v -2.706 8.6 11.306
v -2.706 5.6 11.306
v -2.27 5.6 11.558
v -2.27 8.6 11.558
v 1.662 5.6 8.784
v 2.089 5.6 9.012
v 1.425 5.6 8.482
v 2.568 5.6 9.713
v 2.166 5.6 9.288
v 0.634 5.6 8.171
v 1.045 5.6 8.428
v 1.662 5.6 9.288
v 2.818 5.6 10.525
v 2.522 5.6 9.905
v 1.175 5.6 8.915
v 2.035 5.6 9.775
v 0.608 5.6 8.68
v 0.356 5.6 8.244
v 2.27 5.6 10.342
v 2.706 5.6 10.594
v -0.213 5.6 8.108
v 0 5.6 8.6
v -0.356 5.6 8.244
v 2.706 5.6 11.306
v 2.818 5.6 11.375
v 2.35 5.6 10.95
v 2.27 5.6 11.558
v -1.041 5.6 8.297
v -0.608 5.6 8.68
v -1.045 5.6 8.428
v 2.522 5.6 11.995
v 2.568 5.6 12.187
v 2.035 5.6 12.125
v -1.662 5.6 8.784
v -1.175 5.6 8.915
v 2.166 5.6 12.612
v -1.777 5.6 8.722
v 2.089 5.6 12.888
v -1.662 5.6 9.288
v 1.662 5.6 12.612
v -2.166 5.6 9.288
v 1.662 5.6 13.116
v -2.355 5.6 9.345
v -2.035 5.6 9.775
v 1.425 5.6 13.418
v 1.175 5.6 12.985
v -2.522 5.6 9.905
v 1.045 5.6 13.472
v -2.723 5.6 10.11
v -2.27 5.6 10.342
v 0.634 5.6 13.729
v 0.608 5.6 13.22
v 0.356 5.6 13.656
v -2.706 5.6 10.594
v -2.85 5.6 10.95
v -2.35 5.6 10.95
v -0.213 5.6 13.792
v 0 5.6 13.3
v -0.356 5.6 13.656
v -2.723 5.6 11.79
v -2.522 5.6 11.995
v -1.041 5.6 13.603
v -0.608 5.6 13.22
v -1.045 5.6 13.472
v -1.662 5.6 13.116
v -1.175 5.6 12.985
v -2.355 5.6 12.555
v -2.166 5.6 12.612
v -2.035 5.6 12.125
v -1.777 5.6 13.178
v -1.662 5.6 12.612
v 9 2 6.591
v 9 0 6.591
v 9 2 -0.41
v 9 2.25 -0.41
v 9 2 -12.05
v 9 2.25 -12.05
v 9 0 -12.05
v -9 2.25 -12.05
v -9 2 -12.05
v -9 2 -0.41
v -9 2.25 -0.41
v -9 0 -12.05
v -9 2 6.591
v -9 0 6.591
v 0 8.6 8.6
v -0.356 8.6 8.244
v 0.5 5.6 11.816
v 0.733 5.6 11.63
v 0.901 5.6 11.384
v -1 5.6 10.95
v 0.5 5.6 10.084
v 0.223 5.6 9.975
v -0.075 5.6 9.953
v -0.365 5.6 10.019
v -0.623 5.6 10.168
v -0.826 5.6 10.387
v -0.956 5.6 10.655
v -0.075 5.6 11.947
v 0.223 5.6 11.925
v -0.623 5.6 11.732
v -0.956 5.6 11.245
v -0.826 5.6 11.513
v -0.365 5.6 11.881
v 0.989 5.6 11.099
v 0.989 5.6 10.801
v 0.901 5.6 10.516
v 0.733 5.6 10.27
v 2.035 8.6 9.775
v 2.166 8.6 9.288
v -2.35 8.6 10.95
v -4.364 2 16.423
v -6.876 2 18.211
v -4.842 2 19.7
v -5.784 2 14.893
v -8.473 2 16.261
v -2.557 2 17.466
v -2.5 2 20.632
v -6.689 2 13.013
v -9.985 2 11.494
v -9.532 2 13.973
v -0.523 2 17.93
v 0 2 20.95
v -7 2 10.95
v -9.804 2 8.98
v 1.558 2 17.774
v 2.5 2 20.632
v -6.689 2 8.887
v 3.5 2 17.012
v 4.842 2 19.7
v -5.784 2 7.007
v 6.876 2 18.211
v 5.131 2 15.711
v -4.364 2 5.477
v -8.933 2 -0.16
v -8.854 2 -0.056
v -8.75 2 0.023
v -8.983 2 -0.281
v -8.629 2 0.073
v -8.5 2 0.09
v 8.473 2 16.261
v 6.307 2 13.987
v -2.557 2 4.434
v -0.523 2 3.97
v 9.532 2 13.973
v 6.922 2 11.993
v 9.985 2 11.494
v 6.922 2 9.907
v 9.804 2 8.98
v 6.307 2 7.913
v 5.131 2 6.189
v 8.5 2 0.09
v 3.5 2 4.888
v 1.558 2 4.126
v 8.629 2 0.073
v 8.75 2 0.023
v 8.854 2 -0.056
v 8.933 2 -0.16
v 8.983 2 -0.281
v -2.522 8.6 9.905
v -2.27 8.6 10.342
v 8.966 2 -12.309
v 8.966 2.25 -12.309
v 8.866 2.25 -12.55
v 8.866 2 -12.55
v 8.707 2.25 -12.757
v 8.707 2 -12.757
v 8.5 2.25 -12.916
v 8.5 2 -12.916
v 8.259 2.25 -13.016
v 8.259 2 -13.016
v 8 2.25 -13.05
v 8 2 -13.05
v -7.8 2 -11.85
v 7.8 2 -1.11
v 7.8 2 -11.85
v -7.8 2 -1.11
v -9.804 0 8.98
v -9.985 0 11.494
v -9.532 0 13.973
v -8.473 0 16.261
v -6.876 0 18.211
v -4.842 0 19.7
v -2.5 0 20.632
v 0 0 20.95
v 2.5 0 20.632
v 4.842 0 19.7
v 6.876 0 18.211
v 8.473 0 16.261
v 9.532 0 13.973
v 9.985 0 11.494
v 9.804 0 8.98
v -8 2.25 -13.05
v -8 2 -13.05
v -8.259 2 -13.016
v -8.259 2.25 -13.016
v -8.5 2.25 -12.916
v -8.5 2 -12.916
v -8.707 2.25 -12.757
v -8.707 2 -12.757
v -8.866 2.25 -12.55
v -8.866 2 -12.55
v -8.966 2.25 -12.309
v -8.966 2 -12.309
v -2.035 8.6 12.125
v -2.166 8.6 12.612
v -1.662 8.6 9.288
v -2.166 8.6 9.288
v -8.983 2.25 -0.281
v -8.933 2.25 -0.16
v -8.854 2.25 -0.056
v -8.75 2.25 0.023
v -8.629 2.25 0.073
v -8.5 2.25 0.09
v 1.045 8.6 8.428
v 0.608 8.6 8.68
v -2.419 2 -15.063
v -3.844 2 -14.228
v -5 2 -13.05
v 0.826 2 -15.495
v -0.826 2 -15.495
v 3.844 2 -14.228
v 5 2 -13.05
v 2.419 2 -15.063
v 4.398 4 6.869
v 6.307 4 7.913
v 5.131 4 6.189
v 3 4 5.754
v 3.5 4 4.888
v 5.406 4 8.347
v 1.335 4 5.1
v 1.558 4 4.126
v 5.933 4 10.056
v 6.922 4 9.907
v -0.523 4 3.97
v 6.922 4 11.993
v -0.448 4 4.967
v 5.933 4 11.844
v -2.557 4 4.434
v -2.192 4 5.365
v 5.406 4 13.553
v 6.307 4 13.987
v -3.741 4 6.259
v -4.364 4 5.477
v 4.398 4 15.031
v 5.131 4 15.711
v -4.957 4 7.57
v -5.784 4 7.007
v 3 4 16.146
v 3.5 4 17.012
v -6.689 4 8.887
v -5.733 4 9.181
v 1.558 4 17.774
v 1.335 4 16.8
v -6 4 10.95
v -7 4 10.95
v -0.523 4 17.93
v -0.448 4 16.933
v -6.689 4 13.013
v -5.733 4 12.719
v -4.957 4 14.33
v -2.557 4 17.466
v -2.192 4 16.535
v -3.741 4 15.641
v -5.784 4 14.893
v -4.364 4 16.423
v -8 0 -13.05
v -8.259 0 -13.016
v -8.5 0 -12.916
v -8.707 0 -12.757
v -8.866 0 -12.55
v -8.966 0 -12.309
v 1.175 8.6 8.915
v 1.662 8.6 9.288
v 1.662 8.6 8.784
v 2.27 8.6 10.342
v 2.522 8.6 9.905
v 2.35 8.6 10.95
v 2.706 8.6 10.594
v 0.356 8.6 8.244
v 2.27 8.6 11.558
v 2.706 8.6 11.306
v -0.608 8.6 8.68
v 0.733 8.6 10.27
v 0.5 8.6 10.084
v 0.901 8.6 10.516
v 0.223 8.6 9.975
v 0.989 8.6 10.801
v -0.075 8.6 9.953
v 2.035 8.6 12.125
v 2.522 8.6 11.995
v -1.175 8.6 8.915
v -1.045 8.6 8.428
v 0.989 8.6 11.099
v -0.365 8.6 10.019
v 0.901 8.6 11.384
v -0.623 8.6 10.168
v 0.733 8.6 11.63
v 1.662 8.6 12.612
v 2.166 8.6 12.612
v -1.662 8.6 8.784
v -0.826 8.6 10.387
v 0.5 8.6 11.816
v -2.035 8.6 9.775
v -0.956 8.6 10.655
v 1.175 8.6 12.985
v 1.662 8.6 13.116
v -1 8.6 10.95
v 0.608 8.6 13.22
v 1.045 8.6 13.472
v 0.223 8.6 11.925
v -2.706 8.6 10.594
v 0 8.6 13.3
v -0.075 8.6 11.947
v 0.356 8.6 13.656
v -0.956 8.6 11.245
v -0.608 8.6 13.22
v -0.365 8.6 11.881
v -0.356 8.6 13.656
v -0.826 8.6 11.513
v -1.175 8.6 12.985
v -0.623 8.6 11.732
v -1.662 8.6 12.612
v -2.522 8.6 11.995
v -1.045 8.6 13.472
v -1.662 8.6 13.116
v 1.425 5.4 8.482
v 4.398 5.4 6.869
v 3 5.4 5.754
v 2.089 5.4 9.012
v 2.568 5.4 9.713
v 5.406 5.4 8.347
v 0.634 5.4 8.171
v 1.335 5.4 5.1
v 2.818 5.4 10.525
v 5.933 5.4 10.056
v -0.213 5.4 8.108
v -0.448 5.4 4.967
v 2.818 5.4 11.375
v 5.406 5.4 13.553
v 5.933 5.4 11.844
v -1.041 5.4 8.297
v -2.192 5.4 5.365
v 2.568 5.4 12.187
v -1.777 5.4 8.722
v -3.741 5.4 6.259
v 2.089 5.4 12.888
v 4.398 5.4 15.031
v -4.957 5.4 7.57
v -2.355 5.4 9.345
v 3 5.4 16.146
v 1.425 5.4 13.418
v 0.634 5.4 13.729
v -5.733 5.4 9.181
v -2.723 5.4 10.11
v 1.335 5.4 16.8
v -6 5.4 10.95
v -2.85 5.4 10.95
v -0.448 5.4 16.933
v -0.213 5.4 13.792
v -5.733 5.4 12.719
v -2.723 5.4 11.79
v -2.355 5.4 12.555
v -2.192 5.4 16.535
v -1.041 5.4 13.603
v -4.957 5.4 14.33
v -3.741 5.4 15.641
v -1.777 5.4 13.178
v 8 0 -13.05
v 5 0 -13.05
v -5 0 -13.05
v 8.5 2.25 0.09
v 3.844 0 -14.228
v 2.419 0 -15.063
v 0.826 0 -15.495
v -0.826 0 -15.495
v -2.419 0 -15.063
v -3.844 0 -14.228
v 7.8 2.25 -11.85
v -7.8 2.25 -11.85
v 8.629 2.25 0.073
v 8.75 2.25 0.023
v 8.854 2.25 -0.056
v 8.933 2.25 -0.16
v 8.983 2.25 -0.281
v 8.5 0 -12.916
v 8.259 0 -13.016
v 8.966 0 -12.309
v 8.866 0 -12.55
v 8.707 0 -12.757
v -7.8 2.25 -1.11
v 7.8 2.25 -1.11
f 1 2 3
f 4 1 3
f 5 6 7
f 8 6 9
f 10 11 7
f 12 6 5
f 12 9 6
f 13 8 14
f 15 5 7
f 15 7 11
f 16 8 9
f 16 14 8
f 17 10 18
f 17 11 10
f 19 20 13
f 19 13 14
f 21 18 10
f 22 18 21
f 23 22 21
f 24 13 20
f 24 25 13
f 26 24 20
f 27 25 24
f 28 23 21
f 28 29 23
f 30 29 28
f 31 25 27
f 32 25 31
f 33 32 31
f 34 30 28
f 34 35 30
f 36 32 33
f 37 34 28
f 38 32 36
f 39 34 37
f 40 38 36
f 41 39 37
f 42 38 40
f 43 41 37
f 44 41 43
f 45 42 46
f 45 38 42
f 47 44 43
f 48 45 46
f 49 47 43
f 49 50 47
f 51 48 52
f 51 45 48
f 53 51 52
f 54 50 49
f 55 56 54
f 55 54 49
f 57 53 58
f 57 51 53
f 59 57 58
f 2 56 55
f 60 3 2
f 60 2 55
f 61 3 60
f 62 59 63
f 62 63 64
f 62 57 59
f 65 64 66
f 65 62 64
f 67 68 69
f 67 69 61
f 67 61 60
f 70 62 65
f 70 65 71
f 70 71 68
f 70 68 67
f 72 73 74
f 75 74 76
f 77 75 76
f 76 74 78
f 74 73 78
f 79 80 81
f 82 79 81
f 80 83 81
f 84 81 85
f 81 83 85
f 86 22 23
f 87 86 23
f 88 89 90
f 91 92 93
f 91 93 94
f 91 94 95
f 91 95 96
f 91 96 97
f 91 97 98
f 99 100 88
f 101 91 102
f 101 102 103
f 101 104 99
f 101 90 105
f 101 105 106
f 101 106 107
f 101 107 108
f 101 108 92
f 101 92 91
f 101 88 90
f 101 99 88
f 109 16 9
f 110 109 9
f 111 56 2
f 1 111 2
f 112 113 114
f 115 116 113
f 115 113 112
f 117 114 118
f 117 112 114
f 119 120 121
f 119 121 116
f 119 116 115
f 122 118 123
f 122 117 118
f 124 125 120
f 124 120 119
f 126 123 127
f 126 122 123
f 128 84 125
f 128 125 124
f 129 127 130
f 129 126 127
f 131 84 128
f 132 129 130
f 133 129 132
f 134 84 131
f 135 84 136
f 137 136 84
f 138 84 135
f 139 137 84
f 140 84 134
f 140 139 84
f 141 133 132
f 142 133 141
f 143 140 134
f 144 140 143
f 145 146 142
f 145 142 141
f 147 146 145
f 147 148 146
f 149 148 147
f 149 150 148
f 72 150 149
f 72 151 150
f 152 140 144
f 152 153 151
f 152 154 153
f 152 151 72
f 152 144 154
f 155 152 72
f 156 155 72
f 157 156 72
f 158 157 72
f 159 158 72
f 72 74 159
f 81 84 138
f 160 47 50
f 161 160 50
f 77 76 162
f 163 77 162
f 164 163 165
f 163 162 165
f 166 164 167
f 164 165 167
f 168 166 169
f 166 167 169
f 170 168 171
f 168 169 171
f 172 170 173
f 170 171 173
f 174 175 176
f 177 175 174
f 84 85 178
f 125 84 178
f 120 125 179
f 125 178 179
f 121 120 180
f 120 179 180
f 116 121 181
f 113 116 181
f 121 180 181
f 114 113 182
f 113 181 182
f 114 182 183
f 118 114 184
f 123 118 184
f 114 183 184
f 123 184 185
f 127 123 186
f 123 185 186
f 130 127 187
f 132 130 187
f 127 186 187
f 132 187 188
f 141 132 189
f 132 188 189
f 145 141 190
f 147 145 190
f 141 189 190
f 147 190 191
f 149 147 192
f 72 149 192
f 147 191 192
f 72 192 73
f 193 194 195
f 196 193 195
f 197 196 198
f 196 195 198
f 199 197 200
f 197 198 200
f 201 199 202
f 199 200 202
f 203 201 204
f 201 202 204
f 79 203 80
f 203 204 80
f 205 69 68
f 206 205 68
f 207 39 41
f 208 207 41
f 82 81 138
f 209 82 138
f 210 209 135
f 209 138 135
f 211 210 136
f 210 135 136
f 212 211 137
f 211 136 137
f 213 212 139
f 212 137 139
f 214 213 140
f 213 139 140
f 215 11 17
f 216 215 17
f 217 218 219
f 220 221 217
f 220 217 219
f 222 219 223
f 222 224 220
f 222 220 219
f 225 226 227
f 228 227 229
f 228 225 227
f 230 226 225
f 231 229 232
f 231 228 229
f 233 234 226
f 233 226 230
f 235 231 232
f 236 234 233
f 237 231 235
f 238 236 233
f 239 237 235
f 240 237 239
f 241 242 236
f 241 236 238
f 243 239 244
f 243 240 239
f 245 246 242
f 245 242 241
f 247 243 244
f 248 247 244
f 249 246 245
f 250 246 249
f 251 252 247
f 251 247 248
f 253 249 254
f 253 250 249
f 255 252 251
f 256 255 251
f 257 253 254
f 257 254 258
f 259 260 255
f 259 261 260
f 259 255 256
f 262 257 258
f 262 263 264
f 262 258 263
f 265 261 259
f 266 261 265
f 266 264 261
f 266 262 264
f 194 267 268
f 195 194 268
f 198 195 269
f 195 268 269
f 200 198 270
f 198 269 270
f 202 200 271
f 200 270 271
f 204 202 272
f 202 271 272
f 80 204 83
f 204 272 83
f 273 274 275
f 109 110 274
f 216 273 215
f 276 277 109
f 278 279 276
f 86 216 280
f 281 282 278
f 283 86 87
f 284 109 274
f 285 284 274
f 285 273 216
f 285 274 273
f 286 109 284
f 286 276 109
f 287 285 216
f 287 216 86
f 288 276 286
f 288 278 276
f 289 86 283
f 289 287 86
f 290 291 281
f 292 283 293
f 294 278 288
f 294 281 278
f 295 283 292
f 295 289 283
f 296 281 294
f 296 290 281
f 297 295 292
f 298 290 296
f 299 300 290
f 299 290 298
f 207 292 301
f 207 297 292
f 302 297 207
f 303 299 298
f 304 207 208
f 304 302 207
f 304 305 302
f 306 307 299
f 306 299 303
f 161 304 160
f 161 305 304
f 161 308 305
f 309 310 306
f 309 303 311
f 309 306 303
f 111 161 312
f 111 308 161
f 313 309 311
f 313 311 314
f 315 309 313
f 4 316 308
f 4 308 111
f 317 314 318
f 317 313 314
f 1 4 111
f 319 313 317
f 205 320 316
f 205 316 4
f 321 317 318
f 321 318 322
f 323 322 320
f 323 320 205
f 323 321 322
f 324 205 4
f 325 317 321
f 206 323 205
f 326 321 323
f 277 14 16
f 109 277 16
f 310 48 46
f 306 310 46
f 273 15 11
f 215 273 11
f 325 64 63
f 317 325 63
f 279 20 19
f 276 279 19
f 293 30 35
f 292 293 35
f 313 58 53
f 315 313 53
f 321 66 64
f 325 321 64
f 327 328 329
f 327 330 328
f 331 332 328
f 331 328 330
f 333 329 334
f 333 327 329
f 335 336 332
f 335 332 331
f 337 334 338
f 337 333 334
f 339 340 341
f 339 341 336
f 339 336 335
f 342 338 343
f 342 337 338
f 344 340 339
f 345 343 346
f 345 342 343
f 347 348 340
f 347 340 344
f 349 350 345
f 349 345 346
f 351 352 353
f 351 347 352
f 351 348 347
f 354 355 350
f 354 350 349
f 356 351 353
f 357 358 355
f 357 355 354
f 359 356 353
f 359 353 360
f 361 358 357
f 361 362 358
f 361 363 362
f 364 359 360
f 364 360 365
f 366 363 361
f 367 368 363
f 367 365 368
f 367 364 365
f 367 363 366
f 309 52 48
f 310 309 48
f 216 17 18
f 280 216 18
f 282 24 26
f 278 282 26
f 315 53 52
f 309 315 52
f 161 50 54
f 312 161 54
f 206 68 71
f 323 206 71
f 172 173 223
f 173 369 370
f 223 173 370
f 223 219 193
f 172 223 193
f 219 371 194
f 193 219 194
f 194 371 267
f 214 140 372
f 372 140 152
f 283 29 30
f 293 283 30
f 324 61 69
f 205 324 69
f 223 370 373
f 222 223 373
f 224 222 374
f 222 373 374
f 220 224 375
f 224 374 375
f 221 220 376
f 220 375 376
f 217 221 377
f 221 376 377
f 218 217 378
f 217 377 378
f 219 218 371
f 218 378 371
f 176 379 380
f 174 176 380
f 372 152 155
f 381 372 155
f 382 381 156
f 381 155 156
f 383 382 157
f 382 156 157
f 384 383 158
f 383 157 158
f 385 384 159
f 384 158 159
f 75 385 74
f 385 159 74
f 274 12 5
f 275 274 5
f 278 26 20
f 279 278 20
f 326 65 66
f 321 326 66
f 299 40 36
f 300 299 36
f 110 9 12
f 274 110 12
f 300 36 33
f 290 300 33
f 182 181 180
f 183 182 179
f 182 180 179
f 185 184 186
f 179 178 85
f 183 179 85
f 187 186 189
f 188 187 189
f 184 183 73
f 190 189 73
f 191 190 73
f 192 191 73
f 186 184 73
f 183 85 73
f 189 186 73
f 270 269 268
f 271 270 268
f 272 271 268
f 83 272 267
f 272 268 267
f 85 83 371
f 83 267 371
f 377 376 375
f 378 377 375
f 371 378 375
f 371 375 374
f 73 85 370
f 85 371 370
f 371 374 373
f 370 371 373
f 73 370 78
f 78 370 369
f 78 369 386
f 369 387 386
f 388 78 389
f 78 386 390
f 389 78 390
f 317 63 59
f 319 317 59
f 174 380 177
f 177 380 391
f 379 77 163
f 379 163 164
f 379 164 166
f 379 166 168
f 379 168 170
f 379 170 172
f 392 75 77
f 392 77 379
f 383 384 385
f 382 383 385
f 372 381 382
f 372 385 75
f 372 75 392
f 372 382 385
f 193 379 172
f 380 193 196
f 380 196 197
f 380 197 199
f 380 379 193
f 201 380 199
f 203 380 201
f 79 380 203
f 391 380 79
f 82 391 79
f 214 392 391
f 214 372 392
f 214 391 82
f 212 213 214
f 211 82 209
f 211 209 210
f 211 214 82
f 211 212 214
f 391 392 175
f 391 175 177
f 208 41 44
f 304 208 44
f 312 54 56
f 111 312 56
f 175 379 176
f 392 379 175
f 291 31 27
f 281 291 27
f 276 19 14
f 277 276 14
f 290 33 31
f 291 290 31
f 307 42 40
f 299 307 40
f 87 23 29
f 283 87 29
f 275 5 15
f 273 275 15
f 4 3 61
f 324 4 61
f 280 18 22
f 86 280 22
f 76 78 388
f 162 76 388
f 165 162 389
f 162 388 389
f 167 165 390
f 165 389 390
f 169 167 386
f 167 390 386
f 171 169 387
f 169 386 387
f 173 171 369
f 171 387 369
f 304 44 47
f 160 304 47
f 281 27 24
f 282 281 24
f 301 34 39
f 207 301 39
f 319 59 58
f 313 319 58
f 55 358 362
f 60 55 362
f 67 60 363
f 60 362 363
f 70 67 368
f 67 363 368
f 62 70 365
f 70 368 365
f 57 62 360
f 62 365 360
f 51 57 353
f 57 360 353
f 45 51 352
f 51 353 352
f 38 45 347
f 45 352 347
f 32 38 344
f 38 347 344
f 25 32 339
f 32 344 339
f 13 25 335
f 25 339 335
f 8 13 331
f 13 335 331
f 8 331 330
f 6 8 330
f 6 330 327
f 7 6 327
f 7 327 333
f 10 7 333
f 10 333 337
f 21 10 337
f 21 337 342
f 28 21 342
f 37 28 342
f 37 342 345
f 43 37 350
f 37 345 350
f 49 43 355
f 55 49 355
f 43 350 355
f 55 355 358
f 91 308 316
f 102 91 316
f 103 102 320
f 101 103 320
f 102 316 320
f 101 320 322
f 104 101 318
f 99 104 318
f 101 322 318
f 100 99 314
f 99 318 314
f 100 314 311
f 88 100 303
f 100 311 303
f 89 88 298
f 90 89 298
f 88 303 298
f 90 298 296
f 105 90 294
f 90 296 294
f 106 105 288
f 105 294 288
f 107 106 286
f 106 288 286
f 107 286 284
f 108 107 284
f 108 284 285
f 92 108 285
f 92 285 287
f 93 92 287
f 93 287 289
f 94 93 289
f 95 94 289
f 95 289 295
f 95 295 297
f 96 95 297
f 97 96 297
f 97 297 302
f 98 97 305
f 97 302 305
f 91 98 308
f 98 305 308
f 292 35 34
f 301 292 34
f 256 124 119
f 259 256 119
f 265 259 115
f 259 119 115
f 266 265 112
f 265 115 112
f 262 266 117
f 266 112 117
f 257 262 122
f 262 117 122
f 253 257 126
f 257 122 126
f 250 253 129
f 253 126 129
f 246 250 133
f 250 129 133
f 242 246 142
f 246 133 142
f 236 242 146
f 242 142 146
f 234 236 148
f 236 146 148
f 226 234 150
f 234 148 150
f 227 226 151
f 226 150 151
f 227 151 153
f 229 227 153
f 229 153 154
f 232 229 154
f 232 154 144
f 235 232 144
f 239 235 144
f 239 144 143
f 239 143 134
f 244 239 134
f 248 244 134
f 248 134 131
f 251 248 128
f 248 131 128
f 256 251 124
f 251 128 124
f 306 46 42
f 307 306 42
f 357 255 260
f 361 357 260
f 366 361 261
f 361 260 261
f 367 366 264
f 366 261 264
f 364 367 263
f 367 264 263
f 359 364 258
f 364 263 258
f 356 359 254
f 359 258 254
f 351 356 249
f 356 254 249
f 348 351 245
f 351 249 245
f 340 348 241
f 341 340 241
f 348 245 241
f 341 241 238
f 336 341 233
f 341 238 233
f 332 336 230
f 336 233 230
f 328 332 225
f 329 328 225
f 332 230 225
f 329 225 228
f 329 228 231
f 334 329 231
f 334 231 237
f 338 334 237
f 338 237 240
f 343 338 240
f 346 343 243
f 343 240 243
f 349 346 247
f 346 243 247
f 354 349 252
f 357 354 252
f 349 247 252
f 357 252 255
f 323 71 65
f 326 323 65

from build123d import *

# Parameters (mm, degrees)
BOSS_EXTRUDE1_DEPTH = 2
BOSS_EXTRUDE2_DEPTH = 0.25
SKETCH3_W           = 15.6
SKETCH3_H           = 10.74
CUT_EXTRUDE1_DEPTH  = 0.25
SKETCH4_R           = 7
BOSS_EXTRUDE3_DEPTH = 2
SKETCH5_R           = 6
BOSS_EXTRUDE4_DEPTH = 1.4
SKETCH6_R           = 2.85
BOSS_EXTRUDE5_DEPTH = 0.2
BOSS_EXTRUDE6_DEPTH = 3
SKETCH10_R          = 1
CUT_EXTRUDE4_DEPTH  = 3


with BuildPart() as part:
    # Sketch1 → Boss-Extrude1 (new body)
    with BuildSketch(Plane(origin=(0, 0, 0), x_dir=(1, 0, 0), z_dir=(0, 1, 0))):
        with BuildLine():
            ThreePointArc((5, 13.05), (0, 15.55), (-5, 13.05))
            Line((-5, 13.05), (-8, 13.05))
            ThreePointArc((-8, 13.05), (-8.70710678, 12.757106782), (-9, 12.050000002))
            Line((-9, 12.050000002), (-9, -6.591101056))
            ThreePointArc((-9, -6.591101056), (0, -20.95), (9, -6.591101056))
            Line((9, -6.591101056), (9, 12.05))
            ThreePointArc((9, 12.05), (8.707106781, 12.757106781), (8, 13.05))
            Line((8, 13.05), (5, 13.05))
        make_face()
    extrude(amount=BOSS_EXTRUDE1_DEPTH)

    # Sketch2 → Boss-Extrude2 (add)
    with BuildSketch(Plane(origin=(0, 2, 0), x_dir=(-1, 0, 0), z_dir=(0, 1, 0))):
        with BuildLine():
            Line((-8.000000002, -13.05), (8, -13.05))
            ThreePointArc((8, -13.05), (8.707106781, -12.757106781), (9, -12.05))
            Line((9, -12.05), (9, -0.41))
            ThreePointArc((9, -0.41), (8.853553391, -0.056446609), (8.5, 0.09))
            Line((8.5, 0.09), (-8.5, 0.09))
            ThreePointArc((-8.5, 0.09), (-8.853553391, -0.056446609), (-9, -0.41))
            Line((-9, -0.41), (-9, -12.05))
            ThreePointArc((-9, -12.05), (-8.707106782, -12.757106781), (-8.000000002, -13.05))
        make_face()
    extrude(amount=BOSS_EXTRUDE2_DEPTH)

    # Sketch3 → Cut-Extrude1 (cut)
    with BuildSketch(Plane(origin=(0, 2.25, 0), x_dir=(-1, 0, 0), z_dir=(0, 1, 0))):
        with Locations((0, -6.48)):
            Rectangle(SKETCH3_W, SKETCH3_H)
    extrude(amount=-CUT_EXTRUDE1_DEPTH, mode=Mode.SUBTRACT)

    # Sketch4 → Boss-Extrude3 (add)
    with BuildSketch(Plane(origin=(0, 2, 0), x_dir=(-1, 0, 0), z_dir=(0, 1, 0))):
        with Locations((0, 10.95)):
            Circle(SKETCH4_R)
    extrude(amount=BOSS_EXTRUDE3_DEPTH)

    # Sketch5 → Boss-Extrude4 (add)
    with BuildSketch(Plane(origin=(0, 4, 0), x_dir=(-1, 0, 0), z_dir=(0, 1, 0))):
        with Locations((0, 10.95)):
            Circle(SKETCH5_R)
    extrude(amount=BOSS_EXTRUDE4_DEPTH)

    # Sketch6 → Boss-Extrude5 (add)
    with BuildSketch(Plane(origin=(0, 5.4, 0), x_dir=(-1, 0, 0), z_dir=(0, 1, 0))):
        with Locations((0, 10.95)):
            Circle(SKETCH6_R)
    extrude(amount=BOSS_EXTRUDE5_DEPTH)

    # Sketch9 → Boss-Extrude6 (add)
    with BuildSketch(Plane(origin=(0, 5.6, 0), x_dir=(-1, 0, 0), z_dir=(0, 1, 0))):
        Polygon((-0.356289813, 8.243710187), (0, 8.6), (0.356289813, 8.243710187), (0.608224756, 8.680074308), (1.044588877, 8.428139365), (1.175, 8.914840301), (1.661700936, 8.784429178), (1.661700936, 9.288299064), (2.165570822, 9.288299064), (2.035159699, 9.775), (2.521860635, 9.905411123), (2.269925692, 10.341775244), (2.706289813, 10.593710187), (2.35, 10.95), (2.706289813, 11.306289813), (2.269925692, 11.558224756), (2.521860635, 11.994588877), (2.035159699, 12.125), (2.165570822, 12.611700936), (1.661700936, 12.611700936), (1.661700936, 13.115570822), (1.175, 12.985159699), (1.044588877, 13.471860635), (0.608224756, 13.219925692), (0.356289813, 13.656289813), (0, 13.3), (-0.356289813, 13.656289813), (-0.608224756, 13.219925692), (-1.044588877, 13.471860635), (-1.175, 12.985159699), (-1.661700936, 13.115570822), (-1.661700936, 12.611700936), (-2.165570822, 12.611700936), (-2.035159699, 12.125), (-2.521860635, 11.994588877), (-2.269925692, 11.558224756), (-2.706289813, 11.306289813), (-2.35, 10.95), (-2.706289813, 10.593710187), (-2.269925692, 10.341775244), (-2.521860635, 9.905411123), (-2.035159699, 9.775), (-2.165570822, 9.288299064), (-1.661700936, 9.288299064), (-1.661700936, 8.784429178), (-1.175, 8.914840301), (-1.044588877, 8.428139365), (-0.608224756, 8.680074308), align=None)
    extrude(amount=BOSS_EXTRUDE6_DEPTH)

    # Sketch10 → Cut-Extrude4 (cut)
    with BuildSketch(Plane(origin=(0, 8.6, 0), x_dir=(-1, 0, 0), z_dir=(0, 1, 0))):
        with Locations((0, 10.95)):
            Circle(SKETCH10_R)
    extrude(amount=-CUT_EXTRUDE4_DEPTH, mode=Mode.SUBTRACT)


solid = part.part
